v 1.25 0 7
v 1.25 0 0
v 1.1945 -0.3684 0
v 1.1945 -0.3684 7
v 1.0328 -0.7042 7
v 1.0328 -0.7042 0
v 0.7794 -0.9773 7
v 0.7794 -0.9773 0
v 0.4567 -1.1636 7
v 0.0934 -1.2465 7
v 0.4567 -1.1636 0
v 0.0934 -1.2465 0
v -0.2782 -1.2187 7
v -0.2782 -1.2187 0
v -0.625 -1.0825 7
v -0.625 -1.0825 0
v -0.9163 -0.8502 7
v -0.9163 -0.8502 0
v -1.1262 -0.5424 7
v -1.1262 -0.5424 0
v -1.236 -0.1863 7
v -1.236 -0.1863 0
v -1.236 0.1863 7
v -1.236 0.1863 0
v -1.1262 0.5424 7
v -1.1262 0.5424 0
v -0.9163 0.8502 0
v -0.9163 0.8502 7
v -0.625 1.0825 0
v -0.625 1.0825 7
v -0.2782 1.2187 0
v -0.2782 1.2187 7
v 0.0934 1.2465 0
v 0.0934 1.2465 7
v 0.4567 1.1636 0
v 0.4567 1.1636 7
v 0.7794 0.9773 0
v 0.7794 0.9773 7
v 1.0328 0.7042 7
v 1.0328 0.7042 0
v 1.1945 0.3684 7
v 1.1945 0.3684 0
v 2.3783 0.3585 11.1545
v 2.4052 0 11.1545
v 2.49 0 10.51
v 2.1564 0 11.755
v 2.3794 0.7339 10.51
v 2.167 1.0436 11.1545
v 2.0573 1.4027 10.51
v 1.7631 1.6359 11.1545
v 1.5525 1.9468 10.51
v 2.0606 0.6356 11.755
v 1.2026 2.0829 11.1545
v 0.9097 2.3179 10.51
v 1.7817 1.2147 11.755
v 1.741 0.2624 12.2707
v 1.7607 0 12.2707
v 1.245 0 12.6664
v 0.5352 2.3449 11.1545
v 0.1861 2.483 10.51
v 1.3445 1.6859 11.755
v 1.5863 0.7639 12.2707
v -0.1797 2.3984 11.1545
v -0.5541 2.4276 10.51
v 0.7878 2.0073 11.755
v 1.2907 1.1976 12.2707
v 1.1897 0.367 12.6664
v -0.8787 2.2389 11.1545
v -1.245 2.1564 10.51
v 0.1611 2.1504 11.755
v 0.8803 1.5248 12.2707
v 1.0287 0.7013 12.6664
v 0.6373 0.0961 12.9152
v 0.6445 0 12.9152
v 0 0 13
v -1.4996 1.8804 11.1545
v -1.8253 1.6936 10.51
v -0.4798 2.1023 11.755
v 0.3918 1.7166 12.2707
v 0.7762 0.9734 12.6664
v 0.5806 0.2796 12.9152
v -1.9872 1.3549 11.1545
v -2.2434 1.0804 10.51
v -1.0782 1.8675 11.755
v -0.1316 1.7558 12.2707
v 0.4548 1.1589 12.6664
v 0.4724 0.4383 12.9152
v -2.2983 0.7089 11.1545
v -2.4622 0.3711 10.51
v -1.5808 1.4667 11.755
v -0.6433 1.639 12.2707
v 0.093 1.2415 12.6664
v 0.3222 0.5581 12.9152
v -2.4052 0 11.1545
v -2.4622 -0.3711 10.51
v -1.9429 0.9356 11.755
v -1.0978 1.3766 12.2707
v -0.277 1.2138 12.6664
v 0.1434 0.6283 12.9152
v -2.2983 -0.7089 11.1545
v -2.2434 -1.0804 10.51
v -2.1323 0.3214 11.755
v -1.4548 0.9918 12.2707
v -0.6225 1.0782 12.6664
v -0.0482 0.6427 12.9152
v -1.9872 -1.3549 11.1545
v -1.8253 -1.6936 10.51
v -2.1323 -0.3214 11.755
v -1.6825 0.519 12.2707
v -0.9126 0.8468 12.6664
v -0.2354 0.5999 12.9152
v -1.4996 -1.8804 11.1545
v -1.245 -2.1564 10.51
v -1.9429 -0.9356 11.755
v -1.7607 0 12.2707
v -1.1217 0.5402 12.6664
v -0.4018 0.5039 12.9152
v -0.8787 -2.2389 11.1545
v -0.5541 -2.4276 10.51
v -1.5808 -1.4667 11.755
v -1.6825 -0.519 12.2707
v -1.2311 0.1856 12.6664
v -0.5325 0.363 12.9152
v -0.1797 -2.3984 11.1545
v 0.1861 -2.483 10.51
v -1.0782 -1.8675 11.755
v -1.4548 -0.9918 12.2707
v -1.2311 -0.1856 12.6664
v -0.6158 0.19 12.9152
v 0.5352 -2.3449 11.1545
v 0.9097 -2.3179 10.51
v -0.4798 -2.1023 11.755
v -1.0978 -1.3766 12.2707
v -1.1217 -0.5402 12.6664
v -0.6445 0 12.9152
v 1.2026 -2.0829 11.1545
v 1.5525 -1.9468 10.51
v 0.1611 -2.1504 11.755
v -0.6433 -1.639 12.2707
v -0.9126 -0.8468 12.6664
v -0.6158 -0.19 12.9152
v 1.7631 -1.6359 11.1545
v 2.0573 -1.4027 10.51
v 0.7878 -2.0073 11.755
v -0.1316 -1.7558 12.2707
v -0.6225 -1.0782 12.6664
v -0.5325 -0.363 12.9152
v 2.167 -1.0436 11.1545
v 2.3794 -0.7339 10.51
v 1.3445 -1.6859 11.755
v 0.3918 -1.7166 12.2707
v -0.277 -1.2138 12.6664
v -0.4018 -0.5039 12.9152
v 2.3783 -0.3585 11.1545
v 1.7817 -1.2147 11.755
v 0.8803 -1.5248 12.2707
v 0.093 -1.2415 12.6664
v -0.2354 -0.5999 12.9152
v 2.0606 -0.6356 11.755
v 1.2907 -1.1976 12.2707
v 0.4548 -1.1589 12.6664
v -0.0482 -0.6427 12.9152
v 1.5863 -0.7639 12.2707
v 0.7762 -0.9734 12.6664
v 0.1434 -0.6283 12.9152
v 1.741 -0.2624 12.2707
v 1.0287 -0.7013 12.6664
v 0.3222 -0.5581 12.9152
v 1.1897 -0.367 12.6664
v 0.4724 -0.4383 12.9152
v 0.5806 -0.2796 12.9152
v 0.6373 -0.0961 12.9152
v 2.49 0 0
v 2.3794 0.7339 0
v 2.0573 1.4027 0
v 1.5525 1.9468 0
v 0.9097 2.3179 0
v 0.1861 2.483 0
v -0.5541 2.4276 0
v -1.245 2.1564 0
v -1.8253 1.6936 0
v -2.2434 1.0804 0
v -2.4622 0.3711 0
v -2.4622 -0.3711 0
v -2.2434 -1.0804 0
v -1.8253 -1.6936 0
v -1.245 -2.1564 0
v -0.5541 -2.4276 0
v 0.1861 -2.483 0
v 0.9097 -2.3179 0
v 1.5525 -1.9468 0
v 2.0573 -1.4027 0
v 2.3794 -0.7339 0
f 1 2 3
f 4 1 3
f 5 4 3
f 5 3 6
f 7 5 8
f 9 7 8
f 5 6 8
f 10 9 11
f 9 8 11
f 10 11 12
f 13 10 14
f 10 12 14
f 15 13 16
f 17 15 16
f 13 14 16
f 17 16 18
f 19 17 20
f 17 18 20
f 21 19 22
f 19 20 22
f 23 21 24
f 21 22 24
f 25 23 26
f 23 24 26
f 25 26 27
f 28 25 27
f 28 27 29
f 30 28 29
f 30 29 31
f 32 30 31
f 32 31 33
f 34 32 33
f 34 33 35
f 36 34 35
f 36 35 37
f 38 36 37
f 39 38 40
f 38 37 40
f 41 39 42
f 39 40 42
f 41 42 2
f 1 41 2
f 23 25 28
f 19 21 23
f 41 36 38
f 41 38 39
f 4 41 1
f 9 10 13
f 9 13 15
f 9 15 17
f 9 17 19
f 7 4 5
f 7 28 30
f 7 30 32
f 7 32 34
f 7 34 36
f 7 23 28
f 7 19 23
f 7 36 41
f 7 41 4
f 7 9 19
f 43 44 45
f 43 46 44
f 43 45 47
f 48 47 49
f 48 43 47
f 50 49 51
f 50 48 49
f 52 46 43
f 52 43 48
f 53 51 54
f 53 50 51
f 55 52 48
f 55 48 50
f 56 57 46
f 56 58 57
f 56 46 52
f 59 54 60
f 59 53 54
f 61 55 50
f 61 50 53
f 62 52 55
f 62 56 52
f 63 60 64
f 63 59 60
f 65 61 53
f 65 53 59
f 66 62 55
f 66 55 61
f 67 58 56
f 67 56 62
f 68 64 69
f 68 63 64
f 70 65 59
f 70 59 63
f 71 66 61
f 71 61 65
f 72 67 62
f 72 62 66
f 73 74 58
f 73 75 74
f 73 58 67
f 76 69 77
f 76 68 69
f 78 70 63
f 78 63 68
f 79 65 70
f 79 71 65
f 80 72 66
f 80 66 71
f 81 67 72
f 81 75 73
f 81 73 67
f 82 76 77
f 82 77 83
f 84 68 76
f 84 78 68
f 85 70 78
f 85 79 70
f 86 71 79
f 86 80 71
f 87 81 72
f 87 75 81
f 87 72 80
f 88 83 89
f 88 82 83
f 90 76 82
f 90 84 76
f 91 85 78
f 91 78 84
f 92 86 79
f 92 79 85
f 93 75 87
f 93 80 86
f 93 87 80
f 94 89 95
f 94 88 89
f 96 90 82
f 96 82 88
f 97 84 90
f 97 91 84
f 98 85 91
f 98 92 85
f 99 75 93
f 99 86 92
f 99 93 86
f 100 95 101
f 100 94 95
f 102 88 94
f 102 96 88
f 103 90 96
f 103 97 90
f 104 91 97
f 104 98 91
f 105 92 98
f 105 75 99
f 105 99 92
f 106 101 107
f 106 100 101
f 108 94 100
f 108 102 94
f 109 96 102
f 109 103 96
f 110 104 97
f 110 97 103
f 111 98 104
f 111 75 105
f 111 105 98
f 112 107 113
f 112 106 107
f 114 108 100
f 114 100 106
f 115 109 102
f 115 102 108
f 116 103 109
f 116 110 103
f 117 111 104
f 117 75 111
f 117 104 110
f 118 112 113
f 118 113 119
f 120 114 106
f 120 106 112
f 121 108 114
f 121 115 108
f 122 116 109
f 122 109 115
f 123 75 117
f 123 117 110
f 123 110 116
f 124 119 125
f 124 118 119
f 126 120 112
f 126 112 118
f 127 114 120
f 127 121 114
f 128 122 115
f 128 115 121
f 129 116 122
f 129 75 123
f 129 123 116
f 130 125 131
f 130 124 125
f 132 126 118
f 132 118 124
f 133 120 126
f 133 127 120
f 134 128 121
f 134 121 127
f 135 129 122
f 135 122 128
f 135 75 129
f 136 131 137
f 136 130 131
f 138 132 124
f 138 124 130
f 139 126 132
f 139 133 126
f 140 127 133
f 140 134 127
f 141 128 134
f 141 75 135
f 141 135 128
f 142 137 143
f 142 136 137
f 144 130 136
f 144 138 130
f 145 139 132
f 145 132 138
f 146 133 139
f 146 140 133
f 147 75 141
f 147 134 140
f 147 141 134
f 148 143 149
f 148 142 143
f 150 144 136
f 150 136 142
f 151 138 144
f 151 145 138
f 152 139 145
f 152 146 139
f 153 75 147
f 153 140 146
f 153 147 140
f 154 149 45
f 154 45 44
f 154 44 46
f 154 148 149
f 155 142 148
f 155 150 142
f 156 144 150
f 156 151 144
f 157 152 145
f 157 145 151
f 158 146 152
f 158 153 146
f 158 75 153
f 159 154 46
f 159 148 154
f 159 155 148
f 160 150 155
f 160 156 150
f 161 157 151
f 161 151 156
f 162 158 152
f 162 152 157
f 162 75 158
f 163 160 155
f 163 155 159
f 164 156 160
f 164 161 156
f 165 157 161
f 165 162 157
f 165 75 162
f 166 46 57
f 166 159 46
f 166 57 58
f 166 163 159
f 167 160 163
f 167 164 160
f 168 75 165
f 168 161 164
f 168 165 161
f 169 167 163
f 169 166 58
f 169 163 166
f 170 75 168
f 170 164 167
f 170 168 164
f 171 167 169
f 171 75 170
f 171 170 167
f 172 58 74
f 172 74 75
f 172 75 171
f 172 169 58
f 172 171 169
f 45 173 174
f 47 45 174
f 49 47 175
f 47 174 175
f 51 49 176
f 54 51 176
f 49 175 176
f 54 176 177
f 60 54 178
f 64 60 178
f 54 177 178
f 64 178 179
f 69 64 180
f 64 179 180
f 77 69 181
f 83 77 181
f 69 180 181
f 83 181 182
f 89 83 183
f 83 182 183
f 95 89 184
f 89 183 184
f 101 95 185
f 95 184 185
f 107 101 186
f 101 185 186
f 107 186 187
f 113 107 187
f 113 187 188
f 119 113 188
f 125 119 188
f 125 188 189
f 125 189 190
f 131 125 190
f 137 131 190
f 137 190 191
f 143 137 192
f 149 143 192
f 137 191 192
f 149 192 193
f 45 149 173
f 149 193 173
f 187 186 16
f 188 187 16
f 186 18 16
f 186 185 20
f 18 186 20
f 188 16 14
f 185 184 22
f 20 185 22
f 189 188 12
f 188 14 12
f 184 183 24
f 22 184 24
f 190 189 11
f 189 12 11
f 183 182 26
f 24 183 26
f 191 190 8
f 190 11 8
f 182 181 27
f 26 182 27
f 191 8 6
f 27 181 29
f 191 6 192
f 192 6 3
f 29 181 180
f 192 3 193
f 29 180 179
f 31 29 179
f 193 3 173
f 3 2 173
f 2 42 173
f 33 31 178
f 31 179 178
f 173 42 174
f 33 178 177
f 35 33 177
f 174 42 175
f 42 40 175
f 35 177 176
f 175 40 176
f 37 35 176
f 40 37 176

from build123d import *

# Parameters (mm, degrees)
F0_R     = 2.49
F1_DEPTH = 13
F2_R     = 1.25
F3_DEPTH = 7
F4_R     = 2.49


with BuildPart() as f1:
    # F0 (on Top) → F1 (new body)
    with BuildSketch(Plane.XY):
        Circle(F0_R)
    extrude(amount=F1_DEPTH)

    # F2 (on face) → F3 (cut)
    with BuildSketch(Plane(origin=(0, 0, 0), x_dir=(1, 0, 0), z_dir=(0, 0, -1))):
        Circle(F2_R)
    extrude(amount=-F3_DEPTH, mode=Mode.SUBTRACT)

    # F4
    f4_edges = [f1.edges().sort_by_distance(p)[0] for p in [
        (-2.49, 0, 13),
    ]]
    fillet(f4_edges, radius=F4_R)


solid = f1.part
